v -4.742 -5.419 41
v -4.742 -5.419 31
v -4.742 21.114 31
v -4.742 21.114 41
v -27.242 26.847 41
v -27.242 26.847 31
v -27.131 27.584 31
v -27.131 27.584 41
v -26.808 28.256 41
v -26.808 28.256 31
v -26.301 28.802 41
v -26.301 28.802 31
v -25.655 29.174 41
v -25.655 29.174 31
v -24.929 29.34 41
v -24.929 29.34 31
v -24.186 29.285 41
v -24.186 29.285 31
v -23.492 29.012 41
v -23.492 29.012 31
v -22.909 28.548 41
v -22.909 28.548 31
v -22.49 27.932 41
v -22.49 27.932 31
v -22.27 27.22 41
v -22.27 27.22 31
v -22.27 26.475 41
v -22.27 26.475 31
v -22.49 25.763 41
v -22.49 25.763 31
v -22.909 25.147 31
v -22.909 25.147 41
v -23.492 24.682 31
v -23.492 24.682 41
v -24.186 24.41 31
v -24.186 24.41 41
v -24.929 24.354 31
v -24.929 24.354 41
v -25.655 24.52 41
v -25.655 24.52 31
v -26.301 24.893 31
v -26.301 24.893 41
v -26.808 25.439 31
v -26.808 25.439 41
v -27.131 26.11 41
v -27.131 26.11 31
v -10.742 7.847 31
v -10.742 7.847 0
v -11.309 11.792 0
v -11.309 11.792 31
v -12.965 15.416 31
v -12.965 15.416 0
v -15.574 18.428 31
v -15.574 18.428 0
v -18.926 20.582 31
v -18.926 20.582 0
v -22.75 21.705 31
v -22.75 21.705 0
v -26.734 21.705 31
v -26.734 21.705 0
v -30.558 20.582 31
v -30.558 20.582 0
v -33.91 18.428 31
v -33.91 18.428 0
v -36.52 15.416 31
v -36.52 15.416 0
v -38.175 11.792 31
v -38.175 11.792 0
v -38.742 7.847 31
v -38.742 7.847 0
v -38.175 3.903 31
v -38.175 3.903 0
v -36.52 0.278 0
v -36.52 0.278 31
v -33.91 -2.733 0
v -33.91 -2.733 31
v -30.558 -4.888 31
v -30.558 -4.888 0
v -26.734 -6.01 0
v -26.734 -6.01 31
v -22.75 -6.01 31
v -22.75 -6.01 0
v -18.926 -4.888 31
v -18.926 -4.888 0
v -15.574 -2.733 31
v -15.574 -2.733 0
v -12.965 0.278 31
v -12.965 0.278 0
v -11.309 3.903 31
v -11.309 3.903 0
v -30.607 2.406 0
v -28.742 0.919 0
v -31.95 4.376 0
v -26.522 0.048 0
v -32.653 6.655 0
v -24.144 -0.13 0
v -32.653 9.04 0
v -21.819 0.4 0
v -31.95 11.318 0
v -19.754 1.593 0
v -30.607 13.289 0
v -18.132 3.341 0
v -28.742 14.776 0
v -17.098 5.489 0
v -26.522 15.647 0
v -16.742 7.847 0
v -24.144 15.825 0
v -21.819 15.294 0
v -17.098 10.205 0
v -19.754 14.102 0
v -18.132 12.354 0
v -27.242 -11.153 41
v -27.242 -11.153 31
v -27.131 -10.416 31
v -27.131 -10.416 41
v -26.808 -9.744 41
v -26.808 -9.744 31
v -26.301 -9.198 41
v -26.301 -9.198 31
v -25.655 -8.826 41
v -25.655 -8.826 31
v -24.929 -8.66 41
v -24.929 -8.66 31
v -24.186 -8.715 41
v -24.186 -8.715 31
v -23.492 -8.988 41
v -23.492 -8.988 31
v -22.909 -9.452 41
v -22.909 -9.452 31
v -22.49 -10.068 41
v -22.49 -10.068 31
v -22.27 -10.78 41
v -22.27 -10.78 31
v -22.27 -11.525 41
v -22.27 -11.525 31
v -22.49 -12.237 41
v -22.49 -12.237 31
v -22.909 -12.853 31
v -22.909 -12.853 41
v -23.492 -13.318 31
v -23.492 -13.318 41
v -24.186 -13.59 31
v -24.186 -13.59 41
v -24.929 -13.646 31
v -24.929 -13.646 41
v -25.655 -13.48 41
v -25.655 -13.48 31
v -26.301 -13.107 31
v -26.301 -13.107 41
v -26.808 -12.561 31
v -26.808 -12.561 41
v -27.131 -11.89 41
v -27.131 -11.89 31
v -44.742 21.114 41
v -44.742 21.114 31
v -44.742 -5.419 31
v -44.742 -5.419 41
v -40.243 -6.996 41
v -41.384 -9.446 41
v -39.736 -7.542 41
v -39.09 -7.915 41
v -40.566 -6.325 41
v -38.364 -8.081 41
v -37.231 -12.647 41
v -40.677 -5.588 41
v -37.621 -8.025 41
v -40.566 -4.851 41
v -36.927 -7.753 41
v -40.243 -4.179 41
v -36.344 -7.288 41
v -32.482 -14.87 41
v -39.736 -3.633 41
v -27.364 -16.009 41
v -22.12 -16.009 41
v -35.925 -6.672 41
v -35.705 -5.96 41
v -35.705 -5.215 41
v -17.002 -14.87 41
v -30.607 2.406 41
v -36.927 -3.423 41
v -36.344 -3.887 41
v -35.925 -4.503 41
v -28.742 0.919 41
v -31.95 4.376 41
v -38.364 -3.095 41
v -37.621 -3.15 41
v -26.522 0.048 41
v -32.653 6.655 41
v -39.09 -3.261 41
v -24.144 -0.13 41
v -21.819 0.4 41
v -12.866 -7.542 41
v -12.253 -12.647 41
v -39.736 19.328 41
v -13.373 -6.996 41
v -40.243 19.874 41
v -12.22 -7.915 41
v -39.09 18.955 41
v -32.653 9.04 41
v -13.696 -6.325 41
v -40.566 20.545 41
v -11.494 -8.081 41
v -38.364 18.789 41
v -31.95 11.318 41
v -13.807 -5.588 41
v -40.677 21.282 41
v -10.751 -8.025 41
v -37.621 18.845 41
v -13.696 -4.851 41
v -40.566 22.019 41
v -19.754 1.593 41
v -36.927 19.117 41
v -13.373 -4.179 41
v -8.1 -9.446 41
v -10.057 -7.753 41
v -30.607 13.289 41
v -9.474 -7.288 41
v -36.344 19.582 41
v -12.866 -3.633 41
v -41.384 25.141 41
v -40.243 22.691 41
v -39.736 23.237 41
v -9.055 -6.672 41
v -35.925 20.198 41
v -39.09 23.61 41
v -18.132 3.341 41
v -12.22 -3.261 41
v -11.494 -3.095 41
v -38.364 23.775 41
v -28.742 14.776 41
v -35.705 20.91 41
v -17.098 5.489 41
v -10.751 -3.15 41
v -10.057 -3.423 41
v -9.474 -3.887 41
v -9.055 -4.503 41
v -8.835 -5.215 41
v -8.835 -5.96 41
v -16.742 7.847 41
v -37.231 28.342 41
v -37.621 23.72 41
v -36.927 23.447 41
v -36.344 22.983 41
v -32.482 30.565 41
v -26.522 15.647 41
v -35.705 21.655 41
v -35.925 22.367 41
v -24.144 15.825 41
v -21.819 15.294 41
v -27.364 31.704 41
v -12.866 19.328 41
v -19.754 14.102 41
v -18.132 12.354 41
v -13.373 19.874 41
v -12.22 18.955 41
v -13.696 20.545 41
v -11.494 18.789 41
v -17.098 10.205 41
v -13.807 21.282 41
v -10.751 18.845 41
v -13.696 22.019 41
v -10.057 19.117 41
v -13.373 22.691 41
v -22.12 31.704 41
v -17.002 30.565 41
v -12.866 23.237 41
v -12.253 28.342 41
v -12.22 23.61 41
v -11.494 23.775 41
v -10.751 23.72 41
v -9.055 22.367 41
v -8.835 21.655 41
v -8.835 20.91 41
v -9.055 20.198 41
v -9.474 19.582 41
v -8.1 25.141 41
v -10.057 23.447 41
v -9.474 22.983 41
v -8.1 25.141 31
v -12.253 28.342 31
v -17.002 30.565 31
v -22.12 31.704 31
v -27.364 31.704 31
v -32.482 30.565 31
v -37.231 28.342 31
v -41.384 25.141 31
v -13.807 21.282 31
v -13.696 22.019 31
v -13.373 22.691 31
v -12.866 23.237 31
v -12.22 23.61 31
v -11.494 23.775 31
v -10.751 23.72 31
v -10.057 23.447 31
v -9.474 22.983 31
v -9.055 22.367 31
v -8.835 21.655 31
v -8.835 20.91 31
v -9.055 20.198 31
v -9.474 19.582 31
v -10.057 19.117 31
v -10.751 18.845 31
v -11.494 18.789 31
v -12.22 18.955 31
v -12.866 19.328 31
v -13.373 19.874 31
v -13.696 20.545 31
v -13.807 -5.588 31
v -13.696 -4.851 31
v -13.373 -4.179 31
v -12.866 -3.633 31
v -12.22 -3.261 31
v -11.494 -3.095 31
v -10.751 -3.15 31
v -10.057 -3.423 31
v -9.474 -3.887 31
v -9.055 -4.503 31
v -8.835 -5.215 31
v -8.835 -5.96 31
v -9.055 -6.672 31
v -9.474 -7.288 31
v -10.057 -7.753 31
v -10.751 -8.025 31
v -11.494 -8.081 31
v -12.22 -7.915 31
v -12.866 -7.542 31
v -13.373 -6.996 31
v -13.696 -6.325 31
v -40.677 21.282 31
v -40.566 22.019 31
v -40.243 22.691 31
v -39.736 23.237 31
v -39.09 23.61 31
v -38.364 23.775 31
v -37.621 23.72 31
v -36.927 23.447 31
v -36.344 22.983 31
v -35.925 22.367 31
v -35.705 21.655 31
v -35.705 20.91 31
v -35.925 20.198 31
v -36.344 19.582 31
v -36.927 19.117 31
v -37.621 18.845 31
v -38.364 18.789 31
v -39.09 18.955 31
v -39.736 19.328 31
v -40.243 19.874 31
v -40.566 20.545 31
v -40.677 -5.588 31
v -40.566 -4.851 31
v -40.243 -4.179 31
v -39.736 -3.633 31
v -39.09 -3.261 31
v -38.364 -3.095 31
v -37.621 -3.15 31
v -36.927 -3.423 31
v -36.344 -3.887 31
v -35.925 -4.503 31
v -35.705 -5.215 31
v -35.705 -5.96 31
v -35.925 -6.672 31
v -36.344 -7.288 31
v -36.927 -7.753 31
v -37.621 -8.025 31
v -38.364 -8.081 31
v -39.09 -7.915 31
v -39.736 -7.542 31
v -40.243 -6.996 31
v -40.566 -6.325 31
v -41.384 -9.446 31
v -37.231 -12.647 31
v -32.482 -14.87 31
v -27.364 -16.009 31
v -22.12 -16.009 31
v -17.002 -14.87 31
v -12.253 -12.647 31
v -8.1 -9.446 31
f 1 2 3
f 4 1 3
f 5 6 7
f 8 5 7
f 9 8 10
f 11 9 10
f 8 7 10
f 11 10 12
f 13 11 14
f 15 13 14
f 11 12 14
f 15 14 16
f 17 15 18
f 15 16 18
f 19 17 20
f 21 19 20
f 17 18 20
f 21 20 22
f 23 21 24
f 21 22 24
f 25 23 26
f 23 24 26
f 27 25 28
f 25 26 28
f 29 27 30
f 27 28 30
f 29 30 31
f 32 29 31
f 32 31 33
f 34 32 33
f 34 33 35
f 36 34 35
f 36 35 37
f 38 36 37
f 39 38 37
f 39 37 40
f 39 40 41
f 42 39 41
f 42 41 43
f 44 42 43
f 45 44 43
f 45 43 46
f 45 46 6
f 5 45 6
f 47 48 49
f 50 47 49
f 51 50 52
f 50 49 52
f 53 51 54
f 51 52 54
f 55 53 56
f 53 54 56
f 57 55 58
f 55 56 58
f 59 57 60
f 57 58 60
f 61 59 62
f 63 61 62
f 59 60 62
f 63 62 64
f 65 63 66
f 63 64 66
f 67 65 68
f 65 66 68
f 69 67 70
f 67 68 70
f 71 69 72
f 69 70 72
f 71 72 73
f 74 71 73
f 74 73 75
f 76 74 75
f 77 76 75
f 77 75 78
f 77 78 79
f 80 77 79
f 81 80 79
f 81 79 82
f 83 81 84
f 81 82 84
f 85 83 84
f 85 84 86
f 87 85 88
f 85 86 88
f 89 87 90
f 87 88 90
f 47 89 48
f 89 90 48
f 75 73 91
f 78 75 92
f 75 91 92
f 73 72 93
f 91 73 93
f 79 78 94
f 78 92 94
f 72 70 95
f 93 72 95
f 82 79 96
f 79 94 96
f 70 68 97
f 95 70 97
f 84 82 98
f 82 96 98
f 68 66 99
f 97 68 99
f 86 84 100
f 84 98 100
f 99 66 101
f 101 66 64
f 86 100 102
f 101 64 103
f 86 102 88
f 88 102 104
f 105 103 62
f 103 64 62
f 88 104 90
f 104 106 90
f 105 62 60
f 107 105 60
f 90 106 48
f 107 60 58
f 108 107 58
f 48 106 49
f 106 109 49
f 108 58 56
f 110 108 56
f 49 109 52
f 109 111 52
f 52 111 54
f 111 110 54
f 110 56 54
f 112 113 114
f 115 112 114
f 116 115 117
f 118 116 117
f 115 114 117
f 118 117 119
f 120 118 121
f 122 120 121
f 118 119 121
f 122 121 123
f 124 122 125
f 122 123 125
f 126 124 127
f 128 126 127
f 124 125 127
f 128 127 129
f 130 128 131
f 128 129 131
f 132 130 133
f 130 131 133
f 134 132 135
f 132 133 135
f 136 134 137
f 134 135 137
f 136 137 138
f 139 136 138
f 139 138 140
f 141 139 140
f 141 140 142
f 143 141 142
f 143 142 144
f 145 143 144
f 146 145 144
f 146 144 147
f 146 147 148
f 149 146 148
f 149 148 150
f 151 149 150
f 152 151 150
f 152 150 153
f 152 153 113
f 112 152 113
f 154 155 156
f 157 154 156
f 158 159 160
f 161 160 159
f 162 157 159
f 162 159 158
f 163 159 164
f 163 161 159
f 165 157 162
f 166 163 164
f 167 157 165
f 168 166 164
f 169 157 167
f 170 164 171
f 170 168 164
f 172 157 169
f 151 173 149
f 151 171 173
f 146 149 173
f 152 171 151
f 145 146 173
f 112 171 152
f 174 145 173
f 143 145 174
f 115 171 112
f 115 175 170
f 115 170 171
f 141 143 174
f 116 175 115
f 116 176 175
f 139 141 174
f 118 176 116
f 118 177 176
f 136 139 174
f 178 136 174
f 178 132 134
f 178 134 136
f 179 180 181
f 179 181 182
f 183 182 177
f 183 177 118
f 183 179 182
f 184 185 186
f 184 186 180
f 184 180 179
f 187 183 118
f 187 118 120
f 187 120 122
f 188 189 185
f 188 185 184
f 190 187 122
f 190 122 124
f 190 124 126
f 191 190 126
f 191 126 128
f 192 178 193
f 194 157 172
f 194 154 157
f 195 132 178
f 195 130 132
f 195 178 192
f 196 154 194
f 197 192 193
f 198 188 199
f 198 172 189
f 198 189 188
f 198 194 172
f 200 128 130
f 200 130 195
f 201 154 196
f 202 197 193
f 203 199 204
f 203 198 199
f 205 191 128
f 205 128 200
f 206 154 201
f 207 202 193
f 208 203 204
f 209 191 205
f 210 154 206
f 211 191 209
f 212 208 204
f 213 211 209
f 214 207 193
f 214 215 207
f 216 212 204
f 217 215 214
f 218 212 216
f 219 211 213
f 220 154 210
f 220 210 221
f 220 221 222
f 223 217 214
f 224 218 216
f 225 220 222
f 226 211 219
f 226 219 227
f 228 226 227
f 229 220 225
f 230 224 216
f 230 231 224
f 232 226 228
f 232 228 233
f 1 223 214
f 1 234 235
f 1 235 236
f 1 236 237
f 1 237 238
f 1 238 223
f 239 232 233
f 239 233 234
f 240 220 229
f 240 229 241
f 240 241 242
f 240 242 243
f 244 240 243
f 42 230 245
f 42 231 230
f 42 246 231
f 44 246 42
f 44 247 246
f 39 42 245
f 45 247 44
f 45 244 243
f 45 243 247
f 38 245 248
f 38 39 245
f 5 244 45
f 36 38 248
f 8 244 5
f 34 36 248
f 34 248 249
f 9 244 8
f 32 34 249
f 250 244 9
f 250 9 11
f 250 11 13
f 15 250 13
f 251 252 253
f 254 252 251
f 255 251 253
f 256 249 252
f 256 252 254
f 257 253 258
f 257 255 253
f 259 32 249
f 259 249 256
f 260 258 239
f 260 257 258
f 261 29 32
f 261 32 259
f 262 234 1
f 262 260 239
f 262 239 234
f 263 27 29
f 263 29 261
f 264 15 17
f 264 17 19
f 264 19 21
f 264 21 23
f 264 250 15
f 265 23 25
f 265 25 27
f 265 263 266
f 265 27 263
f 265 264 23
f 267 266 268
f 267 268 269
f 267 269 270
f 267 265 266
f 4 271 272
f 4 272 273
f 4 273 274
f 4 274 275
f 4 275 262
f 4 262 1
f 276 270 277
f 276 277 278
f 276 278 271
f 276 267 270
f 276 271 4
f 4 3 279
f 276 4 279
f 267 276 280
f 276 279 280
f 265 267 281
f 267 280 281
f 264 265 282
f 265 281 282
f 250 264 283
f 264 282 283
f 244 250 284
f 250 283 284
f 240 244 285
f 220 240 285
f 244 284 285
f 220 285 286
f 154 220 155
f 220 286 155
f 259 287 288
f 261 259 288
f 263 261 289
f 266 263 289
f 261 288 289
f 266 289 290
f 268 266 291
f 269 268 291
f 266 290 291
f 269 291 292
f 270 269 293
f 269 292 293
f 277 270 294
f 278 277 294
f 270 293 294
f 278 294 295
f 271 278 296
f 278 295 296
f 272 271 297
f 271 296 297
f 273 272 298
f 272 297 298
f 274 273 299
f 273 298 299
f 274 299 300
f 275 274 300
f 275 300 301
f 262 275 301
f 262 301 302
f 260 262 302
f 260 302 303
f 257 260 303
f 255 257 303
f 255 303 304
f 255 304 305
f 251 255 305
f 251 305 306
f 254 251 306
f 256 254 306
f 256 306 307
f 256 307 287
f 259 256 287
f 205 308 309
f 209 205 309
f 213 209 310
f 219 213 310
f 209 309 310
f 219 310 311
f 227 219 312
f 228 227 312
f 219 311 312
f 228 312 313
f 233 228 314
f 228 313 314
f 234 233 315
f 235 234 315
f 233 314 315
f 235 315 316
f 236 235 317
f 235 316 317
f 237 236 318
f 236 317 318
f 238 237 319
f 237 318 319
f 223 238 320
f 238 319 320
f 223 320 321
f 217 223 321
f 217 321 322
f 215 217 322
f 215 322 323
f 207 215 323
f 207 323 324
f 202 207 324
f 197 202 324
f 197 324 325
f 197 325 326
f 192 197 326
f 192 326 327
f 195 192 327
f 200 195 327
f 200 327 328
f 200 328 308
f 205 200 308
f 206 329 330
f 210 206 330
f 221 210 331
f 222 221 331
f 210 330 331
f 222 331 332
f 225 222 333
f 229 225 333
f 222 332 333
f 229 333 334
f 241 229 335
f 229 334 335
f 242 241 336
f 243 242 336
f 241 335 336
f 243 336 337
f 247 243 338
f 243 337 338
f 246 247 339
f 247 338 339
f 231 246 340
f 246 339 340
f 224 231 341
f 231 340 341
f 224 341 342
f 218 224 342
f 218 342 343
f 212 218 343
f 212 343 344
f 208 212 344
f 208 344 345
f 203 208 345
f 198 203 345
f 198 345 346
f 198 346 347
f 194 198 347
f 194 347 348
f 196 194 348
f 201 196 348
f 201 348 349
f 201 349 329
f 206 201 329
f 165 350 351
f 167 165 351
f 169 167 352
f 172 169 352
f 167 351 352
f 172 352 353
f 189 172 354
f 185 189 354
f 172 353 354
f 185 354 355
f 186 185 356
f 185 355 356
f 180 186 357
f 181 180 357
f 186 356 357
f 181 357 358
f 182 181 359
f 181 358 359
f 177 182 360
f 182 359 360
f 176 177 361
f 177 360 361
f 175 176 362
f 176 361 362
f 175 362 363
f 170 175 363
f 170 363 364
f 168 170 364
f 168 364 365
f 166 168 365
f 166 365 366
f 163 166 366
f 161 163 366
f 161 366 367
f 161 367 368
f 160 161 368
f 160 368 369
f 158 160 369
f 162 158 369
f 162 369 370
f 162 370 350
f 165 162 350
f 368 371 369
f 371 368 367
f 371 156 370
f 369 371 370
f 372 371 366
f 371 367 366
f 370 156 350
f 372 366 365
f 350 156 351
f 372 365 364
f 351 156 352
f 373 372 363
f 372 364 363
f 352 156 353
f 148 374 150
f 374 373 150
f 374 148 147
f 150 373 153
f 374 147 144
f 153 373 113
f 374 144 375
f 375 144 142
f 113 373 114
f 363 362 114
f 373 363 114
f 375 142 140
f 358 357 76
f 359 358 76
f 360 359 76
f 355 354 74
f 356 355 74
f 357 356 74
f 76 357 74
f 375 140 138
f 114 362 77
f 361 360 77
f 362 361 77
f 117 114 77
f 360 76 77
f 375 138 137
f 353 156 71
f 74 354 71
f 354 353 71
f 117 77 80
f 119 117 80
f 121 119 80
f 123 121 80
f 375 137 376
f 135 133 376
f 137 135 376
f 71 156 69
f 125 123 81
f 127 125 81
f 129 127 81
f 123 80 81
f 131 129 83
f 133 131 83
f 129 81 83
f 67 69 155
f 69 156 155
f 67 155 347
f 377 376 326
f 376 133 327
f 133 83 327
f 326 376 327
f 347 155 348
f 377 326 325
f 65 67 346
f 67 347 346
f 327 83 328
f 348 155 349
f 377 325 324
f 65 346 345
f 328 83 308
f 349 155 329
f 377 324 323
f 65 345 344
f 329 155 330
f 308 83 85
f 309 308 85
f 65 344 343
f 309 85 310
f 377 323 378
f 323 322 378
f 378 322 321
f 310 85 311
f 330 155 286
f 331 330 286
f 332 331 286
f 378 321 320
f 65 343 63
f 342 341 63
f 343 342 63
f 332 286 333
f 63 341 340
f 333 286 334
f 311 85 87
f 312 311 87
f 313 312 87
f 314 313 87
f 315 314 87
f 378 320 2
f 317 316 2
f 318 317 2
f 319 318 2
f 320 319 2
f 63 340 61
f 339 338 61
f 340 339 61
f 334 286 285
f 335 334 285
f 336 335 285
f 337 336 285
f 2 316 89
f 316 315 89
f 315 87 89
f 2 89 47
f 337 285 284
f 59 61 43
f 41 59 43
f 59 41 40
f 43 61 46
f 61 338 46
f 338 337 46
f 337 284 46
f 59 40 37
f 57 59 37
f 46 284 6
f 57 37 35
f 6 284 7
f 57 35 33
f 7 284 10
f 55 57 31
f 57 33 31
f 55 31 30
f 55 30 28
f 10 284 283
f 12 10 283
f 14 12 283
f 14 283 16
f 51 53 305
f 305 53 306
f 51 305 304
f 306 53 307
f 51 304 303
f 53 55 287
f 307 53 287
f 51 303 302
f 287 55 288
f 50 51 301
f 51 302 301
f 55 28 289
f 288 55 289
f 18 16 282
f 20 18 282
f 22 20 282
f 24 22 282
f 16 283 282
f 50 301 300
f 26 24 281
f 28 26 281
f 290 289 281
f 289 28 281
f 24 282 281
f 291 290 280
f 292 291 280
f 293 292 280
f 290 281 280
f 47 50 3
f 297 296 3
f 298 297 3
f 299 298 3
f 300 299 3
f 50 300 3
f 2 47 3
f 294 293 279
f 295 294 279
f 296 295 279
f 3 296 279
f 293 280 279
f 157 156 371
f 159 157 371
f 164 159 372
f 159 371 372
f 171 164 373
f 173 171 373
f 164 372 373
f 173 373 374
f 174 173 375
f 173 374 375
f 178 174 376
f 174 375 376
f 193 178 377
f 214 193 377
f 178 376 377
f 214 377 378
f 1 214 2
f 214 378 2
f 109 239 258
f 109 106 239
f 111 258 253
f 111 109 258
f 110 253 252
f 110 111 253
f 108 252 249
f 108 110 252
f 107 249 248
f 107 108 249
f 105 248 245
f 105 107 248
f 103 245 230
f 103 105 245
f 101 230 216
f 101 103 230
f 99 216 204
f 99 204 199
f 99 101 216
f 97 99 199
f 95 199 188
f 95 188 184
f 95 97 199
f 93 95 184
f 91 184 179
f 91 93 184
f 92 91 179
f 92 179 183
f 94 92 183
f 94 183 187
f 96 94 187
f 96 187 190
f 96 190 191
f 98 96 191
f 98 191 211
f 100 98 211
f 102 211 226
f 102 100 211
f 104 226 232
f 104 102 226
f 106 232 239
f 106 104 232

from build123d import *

# Parameters (mm, degrees)
F0_R     = 14
F0_R_2   = 8
F1_DEPTH = 31
F2_R     = 14
F2_R_2   = 8
F3_DEPTH = 10
F5_D     = 5


with BuildPart() as f1:
    # F0 (on Top) → F1 (new body)
    with BuildSketch(Plane.XY):
        with Locations((-24.742087, 7.847304)):
            Circle(F0_R)
        with Locations((-24.742087, 7.847304)):
            Circle(F0_R_2, mode=Mode.SUBTRACT)
    extrude(amount=F1_DEPTH)

    # F2 (on face) → F3 (join)
    with BuildSketch(Plane.XY.offset(31)):
        with BuildLine():
            Line((-4.742087, -5.419196), (-4.742087, 21.113803))
            ThreePointArc((-4.742087, 21.113803), (-24.742087, 31.847304), (-44.742087, 21.113803))
            Line((-44.742087, 21.113803), (-44.742087, -5.419196))
            ThreePointArc((-44.742087, -5.419196), (-24.742087, -16.152696), (-4.742087, -5.419196))
        make_face()
        with Locations((-24.742087, 7.847304)):
            Circle(F2_R, mode=Mode.SUBTRACT)
        with Locations((-24.742087, 7.847304)):
            Circle(F2_R)
        with Locations((-24.742087, 7.847304)):
            Circle(F2_R_2, mode=Mode.SUBTRACT)
    extrude(amount=F3_DEPTH)

    # F5 (through all)
    with Locations(Plane.XY.offset(41)):
        with Locations((-38.177116, 21.282332), (-24.742087, 26.847304), (-11.307059, 21.282332), (-11.307059, -5.587725), (-24.742087, -11.152696), (-38.177116, -5.587725)):
            Hole(F5_D / 2)


solid = f1.part
